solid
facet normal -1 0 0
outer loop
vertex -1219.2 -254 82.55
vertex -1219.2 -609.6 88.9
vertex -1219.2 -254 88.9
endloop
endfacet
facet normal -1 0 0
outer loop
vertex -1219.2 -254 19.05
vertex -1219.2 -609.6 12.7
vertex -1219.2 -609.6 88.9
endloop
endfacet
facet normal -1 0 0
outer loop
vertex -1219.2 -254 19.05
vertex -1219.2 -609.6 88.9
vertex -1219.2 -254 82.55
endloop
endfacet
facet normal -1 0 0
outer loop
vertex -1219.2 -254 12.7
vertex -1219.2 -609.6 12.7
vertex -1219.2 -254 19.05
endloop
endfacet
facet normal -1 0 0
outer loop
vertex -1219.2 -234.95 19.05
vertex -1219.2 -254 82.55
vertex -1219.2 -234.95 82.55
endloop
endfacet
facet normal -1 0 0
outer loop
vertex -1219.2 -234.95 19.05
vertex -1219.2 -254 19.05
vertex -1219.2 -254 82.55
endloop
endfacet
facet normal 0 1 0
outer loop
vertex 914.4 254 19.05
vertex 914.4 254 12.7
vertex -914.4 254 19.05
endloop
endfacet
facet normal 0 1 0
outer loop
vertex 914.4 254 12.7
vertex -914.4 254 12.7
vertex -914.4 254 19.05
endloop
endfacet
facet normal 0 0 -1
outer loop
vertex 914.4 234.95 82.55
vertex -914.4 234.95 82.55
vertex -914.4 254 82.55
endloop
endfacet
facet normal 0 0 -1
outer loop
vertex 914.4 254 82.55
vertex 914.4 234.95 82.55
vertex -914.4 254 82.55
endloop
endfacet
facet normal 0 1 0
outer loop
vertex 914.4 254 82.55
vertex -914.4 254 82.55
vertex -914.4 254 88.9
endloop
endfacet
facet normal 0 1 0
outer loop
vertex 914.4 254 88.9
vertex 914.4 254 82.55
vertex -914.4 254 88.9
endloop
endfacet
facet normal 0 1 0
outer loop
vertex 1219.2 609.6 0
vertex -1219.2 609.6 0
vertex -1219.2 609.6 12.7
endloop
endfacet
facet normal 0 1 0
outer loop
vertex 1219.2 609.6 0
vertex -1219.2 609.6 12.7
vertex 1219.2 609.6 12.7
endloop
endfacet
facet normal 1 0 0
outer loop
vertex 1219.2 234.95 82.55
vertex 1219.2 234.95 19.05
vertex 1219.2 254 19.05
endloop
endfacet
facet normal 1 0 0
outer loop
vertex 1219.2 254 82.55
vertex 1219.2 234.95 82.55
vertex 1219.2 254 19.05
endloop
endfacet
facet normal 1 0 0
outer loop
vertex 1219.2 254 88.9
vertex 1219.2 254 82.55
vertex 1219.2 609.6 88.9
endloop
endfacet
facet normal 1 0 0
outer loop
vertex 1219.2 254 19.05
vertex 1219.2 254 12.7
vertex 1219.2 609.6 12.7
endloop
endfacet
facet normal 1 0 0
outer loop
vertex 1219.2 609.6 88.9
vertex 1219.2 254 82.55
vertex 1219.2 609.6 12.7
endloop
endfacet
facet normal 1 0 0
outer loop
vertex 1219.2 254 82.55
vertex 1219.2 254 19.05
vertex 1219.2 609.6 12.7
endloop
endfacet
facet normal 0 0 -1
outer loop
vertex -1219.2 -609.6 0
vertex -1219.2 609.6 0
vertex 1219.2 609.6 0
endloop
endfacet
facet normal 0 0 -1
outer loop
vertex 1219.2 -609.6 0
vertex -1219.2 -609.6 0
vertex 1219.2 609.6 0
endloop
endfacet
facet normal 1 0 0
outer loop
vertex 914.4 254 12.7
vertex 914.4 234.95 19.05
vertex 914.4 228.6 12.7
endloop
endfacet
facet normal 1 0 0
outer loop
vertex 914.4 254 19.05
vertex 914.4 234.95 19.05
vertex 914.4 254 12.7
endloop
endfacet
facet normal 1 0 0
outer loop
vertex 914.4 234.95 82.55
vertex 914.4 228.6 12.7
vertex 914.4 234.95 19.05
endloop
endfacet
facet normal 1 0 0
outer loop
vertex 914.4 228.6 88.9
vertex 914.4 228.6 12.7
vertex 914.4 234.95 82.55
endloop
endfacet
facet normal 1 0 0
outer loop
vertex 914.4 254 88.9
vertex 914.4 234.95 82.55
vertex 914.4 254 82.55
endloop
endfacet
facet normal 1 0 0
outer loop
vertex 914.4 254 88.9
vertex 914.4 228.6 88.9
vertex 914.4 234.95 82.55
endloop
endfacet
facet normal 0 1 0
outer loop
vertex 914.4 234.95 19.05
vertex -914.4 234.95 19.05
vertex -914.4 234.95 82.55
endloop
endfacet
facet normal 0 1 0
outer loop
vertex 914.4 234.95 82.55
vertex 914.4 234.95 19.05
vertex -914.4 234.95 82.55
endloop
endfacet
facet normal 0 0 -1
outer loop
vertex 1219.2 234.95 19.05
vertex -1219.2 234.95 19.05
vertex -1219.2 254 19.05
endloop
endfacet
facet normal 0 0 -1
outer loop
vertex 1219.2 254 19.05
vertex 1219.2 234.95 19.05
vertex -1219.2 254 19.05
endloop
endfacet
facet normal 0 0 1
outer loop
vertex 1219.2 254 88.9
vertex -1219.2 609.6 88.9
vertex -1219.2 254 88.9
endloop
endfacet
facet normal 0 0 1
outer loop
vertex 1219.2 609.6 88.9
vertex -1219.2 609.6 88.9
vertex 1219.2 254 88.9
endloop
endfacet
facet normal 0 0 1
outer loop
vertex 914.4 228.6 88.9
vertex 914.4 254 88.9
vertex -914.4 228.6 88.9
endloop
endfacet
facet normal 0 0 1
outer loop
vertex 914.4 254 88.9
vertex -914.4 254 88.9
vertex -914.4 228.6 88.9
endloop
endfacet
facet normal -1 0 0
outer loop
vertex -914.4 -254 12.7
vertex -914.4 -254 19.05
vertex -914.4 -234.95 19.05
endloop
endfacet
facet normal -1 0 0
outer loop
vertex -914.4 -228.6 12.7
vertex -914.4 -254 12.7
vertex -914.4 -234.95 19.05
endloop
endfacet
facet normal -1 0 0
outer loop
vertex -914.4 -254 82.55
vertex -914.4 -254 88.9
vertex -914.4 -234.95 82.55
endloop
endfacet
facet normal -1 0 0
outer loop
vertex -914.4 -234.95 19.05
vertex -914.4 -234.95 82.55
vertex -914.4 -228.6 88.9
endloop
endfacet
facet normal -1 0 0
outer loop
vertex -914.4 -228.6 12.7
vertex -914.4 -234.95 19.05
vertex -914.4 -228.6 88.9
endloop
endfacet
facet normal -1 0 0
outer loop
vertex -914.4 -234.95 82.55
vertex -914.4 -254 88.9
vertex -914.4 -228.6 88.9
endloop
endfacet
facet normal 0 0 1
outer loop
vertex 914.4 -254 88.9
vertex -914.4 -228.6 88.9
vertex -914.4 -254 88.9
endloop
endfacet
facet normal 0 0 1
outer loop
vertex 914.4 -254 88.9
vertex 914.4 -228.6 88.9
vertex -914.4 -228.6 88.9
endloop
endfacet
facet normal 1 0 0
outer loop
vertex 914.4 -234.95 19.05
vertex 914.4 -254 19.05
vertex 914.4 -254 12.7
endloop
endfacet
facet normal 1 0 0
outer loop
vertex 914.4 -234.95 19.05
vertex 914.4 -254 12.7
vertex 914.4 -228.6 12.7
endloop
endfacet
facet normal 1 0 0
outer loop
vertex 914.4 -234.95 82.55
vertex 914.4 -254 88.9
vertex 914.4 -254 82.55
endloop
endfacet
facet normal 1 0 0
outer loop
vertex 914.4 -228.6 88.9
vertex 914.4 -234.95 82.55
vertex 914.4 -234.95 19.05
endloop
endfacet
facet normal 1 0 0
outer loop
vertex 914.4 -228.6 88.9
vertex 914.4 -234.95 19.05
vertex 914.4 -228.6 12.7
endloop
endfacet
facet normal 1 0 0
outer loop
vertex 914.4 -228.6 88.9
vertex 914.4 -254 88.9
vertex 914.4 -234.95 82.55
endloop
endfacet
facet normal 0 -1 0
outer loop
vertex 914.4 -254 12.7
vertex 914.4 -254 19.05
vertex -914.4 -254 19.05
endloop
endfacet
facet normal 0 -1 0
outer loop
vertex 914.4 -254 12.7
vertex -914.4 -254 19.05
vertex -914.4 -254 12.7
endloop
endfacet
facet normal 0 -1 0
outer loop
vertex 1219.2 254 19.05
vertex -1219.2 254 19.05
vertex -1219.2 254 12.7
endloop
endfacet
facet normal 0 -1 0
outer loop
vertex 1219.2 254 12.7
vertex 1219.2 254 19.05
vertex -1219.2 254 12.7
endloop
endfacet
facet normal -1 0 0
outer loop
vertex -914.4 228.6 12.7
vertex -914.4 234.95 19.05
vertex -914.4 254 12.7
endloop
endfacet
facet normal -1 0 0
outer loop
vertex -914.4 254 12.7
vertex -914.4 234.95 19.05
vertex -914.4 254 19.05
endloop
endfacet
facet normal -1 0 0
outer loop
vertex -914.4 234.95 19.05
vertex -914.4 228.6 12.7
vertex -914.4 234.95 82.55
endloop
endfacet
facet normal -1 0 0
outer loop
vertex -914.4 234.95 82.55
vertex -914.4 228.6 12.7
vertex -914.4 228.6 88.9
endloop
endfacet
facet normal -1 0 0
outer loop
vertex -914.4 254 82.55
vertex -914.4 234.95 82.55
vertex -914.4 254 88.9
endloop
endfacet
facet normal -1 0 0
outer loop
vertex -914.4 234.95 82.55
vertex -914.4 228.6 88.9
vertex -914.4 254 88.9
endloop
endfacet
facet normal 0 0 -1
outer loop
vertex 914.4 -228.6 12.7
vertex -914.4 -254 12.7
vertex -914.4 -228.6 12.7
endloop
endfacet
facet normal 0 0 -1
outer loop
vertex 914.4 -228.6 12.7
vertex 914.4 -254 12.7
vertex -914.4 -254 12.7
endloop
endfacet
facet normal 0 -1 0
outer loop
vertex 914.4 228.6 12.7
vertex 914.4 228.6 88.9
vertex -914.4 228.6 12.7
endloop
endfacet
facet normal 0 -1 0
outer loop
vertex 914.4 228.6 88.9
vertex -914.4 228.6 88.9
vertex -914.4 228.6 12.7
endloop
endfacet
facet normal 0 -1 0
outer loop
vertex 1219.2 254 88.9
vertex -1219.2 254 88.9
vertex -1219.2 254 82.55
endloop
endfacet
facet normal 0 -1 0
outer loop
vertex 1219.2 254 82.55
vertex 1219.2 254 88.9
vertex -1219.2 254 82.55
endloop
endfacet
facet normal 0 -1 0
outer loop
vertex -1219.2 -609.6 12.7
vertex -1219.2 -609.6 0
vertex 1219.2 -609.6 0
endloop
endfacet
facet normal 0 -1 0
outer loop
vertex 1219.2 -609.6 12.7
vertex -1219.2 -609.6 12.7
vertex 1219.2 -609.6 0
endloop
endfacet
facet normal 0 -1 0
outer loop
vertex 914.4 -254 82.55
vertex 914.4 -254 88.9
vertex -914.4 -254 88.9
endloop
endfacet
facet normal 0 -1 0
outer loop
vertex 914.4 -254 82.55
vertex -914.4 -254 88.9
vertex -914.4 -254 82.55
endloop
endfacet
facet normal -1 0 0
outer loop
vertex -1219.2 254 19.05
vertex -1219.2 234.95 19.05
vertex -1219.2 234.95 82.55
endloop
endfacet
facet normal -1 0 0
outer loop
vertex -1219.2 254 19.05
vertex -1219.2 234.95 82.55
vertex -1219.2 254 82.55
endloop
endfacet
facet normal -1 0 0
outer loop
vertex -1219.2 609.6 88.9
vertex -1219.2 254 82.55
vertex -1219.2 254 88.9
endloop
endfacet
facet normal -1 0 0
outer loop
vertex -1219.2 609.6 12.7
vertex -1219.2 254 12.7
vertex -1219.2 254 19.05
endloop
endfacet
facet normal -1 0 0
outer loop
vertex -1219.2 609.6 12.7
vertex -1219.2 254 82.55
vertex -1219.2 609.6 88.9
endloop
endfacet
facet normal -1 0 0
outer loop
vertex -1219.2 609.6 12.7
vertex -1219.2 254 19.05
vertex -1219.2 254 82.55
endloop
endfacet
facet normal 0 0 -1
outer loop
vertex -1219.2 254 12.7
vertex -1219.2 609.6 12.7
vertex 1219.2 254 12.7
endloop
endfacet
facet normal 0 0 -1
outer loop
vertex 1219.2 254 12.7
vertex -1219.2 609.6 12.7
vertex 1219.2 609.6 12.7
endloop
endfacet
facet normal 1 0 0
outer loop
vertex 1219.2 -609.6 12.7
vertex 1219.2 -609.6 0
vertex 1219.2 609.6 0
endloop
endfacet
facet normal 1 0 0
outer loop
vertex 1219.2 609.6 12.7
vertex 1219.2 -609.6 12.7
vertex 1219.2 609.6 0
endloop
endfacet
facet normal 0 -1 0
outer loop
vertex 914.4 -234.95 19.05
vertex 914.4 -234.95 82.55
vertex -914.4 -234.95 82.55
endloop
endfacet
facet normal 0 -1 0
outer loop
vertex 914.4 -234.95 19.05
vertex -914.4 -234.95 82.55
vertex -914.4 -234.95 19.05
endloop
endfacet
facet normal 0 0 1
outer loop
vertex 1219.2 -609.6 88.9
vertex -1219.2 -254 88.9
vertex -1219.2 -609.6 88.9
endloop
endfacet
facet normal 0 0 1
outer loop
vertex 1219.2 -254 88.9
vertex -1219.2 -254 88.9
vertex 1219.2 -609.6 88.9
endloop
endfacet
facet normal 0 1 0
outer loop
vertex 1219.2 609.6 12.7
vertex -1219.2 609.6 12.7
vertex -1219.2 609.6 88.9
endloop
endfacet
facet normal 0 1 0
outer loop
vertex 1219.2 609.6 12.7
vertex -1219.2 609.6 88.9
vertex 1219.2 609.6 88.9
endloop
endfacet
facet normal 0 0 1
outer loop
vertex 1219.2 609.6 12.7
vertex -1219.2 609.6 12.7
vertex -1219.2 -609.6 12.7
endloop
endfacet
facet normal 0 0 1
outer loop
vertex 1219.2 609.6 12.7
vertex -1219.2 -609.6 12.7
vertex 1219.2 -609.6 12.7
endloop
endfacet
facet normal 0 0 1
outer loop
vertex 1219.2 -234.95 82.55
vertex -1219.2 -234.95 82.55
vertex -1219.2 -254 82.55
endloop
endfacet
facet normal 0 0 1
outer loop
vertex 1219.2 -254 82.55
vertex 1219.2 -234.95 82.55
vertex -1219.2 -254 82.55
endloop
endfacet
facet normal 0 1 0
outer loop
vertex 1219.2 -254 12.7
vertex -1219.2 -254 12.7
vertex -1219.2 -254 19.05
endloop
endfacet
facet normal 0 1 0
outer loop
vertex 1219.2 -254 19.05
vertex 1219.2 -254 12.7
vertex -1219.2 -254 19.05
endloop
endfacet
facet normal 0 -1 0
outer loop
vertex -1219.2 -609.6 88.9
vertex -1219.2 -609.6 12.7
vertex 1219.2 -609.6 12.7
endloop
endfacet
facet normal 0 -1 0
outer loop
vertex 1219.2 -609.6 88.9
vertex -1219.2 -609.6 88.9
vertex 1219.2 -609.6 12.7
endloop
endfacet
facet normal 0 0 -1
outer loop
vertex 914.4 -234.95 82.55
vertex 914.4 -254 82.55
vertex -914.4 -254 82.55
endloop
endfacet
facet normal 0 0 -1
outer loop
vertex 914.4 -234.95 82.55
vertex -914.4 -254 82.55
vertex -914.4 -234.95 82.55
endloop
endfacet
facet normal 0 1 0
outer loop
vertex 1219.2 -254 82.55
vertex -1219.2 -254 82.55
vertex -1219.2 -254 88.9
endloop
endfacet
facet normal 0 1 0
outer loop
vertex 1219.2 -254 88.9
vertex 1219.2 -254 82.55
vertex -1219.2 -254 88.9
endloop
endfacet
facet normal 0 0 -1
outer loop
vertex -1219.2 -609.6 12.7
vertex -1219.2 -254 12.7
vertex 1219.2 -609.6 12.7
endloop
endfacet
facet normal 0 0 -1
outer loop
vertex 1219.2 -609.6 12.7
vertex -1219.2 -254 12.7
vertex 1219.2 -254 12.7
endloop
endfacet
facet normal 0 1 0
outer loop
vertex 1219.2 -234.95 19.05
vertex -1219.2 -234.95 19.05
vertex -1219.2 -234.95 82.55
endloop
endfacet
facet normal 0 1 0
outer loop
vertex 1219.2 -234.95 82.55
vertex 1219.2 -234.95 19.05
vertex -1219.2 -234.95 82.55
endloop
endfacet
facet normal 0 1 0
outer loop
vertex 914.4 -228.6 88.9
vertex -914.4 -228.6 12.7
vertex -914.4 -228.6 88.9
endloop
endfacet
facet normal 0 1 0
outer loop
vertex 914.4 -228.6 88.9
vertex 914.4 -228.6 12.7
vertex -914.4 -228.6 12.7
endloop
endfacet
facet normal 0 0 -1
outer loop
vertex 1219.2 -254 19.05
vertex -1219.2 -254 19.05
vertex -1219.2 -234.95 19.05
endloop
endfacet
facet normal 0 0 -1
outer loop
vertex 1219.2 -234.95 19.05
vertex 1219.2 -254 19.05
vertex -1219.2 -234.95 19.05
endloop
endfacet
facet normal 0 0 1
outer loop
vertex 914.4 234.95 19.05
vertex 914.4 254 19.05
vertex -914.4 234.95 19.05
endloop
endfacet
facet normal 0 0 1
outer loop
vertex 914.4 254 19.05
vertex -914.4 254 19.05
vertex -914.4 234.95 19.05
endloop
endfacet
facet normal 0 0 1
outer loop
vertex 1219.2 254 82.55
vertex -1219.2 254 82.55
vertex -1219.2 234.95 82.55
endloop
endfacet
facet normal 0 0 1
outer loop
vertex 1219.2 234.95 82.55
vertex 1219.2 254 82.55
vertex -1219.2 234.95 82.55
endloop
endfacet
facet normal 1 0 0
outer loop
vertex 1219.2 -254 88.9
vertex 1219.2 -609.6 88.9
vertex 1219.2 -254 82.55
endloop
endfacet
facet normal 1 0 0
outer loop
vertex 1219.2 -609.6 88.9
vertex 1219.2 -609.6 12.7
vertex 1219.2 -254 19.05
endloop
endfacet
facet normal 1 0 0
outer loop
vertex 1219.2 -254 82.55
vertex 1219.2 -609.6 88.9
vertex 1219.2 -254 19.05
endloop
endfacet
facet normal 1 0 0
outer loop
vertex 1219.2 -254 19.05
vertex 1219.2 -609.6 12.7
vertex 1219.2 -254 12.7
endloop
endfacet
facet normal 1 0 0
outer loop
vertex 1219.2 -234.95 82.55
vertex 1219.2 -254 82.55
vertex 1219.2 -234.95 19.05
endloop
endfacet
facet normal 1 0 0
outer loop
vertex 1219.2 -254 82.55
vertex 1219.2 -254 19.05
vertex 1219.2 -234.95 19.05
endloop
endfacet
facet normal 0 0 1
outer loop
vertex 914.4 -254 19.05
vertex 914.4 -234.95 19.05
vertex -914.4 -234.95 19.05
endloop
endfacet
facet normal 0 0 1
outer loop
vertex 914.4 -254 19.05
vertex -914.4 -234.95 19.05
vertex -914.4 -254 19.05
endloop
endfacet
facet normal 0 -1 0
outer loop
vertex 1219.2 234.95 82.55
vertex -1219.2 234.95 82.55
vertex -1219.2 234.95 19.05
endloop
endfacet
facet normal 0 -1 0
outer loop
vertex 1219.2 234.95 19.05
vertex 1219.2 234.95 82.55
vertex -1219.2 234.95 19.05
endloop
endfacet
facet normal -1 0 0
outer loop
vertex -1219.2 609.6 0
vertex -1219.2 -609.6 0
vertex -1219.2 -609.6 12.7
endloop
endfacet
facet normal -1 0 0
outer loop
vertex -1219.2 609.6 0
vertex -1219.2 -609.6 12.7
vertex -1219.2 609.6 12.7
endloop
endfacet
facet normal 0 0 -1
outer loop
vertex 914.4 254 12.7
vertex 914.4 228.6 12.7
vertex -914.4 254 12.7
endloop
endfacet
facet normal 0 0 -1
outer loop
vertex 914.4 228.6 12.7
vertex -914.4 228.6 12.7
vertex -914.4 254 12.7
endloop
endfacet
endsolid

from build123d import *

# Parameters (mm, degrees)
F0_W     = 2438.4
F0_H     = 1219.2
F1_DEPTH = 12.7
F2_W     = 2438.4
F2_H     = 381
F3_DEPTH = 76.2
F5_DEPTH = 2438.401
F7_DEPTH = 914.4


with BuildPart() as f1:
    # F0 (on Top) → F1 (new body)
    with BuildSketch(Plane.XY):
        Rectangle(F0_W, F0_H)
    extrude(amount=F1_DEPTH)


with BuildPart() as f3:
    # F2 (on face) → F3 (new body)
    with BuildSketch(Plane.XY.offset(12.7)):
        with Locations((0, 419.1)):
            Rectangle(F2_W, F2_H)
        with Locations((0, -419.1)):
            Rectangle(F2_W, F2_H)
    extrude(amount=F3_DEPTH)

    # F4 (on face) → F5 (cut, through all)
    with BuildSketch(Plane(origin=(-1219.2, 0, 0), x_dir=(0, -1, 0), z_dir=(-1, 0, 0))):
        Polygon((-228.6, 88.9), (-254, 88.9), (-254, 82.55), (-234.95, 82.55), (-234.95, 19.05), (-254, 19.05), (-254, 12.7), (-228.6, 12.7), align=None)
        Polygon((254, 82.55), (254, 88.9), (228.6, 88.9), (228.6, 12.7), (254, 12.7), (254, 19.05), (234.95, 19.05), (234.95, 82.55), align=None)
    extrude(amount=-F5_DEPTH, mode=Mode.SUBTRACT)


with BuildPart() as f7:
    # F6 (on Right) → F7 (new body, symmetric)
    with BuildSketch(Plane.YZ):
        Polygon((254, 82.55), (254, 88.9), (228.6, 88.9), (228.6, 12.7), (254, 12.7), (254, 19.05), (234.95, 19.05), (234.95, 82.55), align=None)
        Polygon((-228.6, 88.9), (-254, 88.9), (-254, 82.55), (-234.95, 82.55), (-234.95, 19.05), (-254, 19.05), (-254, 12.7), (-228.6, 12.7), align=None)
    extrude(amount=F7_DEPTH, both=True)


solid = Compound([f1.part, f3.part, f7.part])
